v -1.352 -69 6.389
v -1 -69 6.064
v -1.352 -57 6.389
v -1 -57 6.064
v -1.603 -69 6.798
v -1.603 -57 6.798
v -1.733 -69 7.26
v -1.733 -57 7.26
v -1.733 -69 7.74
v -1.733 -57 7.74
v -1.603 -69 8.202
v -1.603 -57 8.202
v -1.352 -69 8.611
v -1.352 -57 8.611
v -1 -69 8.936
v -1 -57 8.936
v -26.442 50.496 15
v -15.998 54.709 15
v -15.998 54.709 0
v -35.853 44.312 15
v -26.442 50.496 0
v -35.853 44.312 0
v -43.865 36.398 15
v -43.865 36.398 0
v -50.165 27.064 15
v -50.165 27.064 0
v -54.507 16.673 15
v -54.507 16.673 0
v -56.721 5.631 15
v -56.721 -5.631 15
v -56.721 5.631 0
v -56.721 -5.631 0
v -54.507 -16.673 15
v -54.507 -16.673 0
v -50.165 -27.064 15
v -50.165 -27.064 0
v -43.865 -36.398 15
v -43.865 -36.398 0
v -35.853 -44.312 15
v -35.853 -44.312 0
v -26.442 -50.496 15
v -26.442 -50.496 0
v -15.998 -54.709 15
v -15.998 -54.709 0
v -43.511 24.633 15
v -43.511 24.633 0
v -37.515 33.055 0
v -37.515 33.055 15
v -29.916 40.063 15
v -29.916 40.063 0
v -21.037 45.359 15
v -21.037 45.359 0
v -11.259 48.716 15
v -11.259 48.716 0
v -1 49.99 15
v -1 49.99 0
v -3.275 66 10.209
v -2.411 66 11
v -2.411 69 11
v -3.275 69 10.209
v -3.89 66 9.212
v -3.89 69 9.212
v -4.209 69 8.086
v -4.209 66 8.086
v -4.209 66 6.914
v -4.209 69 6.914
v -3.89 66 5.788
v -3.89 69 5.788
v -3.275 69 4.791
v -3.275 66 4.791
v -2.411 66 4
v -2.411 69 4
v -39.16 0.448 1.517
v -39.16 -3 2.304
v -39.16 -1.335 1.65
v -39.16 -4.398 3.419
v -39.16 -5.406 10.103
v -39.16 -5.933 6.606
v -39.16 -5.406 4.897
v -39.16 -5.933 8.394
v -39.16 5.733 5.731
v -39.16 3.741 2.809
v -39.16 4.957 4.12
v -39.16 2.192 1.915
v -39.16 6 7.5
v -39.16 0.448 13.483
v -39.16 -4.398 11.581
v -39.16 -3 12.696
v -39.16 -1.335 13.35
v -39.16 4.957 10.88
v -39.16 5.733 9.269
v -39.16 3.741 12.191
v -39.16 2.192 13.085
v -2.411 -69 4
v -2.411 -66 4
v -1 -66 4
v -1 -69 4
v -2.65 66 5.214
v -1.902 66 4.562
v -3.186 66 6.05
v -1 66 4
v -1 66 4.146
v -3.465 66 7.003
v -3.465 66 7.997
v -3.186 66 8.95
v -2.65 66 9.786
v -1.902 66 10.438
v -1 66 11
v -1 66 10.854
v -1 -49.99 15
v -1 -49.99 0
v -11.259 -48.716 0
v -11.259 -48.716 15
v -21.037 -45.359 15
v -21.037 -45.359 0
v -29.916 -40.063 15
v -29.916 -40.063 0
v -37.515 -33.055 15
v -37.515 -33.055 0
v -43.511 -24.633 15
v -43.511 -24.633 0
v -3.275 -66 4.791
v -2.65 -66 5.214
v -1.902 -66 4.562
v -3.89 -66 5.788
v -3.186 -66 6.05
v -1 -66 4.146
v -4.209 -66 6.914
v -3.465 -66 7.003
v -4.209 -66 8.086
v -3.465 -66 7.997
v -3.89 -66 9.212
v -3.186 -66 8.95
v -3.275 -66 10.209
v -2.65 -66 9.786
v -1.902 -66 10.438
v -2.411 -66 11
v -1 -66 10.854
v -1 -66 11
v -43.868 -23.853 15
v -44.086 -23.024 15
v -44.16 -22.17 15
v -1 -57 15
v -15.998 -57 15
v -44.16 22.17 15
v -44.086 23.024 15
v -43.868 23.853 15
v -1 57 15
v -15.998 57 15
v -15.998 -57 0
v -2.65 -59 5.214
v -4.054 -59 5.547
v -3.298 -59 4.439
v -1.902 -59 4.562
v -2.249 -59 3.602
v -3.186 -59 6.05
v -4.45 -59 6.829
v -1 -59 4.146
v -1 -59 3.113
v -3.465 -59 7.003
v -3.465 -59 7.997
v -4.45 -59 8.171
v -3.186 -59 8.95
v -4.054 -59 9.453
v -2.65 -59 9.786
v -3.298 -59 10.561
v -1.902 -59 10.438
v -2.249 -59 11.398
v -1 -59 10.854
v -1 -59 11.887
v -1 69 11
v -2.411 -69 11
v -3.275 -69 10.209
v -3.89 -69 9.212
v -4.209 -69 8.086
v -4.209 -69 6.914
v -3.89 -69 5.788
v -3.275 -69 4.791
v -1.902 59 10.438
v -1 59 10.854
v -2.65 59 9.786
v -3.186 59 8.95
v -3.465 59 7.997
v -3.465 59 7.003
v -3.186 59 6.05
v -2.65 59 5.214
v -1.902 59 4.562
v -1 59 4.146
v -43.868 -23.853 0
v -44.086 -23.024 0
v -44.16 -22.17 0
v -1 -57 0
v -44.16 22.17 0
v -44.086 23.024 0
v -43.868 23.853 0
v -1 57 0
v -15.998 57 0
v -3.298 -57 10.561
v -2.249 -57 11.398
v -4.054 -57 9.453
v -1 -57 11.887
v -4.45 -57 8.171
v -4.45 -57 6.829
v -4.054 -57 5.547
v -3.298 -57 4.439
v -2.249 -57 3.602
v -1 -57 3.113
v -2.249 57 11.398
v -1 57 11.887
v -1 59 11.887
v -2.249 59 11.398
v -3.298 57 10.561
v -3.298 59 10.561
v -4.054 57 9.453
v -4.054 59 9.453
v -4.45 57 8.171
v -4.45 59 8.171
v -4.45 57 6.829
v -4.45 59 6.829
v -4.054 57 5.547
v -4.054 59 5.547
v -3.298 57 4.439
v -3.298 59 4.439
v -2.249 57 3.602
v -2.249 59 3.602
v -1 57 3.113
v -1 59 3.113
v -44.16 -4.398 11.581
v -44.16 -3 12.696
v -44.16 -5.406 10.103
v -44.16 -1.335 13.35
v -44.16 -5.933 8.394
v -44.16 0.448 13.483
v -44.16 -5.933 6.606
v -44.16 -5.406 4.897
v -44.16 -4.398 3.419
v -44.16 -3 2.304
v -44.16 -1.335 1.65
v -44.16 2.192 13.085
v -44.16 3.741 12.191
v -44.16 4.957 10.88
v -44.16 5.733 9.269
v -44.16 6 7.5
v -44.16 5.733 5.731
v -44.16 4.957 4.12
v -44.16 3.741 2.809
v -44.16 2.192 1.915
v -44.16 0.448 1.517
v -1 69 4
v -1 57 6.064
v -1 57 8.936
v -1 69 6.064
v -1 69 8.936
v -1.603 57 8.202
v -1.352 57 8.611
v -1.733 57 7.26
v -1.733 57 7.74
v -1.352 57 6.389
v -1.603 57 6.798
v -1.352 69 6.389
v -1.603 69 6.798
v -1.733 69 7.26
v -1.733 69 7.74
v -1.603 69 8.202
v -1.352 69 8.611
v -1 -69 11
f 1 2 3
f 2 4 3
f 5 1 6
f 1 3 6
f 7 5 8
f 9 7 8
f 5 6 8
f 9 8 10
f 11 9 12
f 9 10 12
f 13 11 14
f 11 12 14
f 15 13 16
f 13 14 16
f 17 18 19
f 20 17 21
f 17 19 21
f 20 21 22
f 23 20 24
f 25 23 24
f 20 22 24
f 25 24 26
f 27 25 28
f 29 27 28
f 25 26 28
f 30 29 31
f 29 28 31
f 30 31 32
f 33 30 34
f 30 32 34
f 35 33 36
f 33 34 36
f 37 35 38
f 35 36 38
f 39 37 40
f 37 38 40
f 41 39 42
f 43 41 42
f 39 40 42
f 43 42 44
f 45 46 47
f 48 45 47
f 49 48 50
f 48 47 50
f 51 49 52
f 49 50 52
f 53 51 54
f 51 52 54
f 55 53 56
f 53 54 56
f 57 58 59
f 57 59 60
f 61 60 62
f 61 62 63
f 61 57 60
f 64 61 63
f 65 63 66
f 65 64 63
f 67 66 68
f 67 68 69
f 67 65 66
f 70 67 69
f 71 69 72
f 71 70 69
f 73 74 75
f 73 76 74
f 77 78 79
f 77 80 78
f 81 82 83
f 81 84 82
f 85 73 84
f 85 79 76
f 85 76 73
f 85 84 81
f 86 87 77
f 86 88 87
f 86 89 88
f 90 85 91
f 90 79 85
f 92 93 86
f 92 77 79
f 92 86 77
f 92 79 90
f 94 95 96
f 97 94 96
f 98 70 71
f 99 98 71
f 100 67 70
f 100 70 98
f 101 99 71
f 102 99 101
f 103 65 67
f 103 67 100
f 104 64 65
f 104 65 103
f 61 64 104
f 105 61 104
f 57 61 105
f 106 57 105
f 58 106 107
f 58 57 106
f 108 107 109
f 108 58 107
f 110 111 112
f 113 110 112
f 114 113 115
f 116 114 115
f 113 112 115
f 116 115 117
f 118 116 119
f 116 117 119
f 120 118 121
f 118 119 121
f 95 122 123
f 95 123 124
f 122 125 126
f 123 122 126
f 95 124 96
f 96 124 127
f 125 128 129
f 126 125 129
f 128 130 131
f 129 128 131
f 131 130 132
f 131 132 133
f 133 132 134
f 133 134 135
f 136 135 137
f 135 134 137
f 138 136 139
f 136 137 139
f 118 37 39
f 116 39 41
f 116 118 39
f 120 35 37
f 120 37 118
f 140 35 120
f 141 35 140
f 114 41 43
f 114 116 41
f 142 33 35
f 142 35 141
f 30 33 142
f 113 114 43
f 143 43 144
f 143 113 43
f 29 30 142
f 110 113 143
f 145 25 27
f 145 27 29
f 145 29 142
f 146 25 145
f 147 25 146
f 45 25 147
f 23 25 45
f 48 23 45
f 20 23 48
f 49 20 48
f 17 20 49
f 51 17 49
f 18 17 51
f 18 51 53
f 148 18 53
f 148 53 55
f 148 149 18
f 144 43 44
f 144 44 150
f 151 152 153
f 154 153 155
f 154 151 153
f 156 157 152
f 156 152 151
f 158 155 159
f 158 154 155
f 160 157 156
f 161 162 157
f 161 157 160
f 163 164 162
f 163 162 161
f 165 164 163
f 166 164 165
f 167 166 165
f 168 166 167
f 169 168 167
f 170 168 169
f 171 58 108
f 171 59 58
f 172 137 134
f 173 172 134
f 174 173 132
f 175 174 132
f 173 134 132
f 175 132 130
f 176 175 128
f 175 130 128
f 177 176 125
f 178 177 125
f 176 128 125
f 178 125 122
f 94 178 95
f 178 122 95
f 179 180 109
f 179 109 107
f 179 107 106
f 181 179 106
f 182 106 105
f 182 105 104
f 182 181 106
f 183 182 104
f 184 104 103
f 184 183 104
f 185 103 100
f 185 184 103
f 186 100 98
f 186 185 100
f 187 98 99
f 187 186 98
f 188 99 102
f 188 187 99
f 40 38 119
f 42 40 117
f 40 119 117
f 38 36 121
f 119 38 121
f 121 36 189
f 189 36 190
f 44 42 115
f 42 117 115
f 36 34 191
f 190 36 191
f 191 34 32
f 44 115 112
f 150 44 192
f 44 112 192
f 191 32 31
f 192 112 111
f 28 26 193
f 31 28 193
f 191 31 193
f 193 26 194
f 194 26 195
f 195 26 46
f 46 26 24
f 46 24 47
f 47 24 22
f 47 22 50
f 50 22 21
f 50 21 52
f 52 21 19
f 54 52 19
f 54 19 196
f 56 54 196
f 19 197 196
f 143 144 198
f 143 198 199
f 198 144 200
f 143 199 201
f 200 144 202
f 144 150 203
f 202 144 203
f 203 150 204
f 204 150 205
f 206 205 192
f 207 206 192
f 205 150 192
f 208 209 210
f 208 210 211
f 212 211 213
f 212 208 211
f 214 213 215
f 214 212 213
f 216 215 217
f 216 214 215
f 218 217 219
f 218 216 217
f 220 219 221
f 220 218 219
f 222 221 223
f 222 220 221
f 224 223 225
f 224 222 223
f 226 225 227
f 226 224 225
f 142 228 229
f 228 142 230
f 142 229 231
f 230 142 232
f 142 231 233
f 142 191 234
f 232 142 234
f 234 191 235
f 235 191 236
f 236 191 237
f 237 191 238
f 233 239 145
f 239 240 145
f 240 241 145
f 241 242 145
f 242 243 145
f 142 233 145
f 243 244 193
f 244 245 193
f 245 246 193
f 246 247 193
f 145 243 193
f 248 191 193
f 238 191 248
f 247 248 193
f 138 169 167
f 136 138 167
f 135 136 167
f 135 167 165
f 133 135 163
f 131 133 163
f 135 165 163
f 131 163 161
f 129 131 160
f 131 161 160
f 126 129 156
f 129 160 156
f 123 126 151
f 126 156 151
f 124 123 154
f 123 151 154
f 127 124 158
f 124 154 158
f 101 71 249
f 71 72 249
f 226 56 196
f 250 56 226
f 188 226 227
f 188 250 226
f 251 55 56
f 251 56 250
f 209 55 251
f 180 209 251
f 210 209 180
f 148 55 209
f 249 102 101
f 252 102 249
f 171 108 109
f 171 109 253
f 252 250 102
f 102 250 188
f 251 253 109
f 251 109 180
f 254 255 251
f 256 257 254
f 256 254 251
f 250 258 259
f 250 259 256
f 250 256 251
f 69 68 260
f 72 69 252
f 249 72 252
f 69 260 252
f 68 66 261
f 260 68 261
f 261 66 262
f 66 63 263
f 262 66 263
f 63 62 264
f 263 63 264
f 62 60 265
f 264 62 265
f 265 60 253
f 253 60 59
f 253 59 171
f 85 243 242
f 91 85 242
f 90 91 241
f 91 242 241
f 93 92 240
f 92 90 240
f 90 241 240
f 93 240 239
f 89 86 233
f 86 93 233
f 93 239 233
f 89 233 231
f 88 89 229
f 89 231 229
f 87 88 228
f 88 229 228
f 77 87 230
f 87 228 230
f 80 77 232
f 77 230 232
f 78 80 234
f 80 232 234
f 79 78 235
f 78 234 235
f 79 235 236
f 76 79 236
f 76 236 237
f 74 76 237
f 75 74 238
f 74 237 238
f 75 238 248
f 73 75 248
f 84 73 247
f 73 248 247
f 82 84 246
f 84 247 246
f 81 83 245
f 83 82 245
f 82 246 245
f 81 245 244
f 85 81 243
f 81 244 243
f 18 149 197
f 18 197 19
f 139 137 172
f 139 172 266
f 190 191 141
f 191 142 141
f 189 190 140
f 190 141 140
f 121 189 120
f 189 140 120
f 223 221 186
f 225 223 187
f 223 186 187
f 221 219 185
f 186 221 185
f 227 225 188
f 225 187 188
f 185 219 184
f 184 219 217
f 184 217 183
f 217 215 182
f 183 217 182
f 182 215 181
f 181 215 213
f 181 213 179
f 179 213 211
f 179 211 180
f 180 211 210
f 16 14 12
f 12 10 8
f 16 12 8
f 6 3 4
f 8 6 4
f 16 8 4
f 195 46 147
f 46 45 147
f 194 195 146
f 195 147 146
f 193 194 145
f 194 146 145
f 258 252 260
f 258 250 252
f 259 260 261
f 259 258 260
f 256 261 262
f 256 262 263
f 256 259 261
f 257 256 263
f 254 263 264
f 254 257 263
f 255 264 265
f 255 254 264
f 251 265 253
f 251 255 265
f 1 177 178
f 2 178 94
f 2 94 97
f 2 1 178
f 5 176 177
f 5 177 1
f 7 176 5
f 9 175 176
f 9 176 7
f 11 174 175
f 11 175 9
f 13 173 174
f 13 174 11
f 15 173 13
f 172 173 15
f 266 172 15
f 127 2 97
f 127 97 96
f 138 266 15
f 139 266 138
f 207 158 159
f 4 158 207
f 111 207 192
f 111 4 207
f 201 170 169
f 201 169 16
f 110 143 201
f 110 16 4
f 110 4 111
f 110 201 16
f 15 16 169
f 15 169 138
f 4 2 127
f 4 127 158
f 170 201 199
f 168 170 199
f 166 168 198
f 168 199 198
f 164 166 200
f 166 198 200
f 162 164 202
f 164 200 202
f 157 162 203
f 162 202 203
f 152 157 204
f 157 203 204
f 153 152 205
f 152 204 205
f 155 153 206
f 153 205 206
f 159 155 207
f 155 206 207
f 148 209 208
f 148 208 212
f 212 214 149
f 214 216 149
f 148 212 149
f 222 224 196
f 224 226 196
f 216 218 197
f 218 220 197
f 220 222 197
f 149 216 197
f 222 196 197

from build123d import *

# Parameters (mm, degrees)
F1_DEPTH  = 15
F2_R      = 6
F3_DEPTH  = 5
F4_R      = 5
F6_DEPTH  = 2
F8_DEPTH  = 7
F10_DEPTH = 3
F11_DEPTH = 25
F13_W     = 146.8421146274
F13_H     = 28.1250011176
F14_DEPTH = 1
F15_W     = 11.3657170441
F15_H     = 11.5304403007
F15_W_2   = 13.3423628286
F15_H_2   = 13.0129233003
F16_DEPTH = 4
F17_W     = 19.5150814822
F17_H     = 12.7272193491
F17_W_2   = 18.9494257321
F17_H_2   = 10.7474377315
F18_DEPTH = 4


with BuildPart() as f1:
    # F0 (on Top) → F1 (new body)
    with BuildSketch(Plane.XY):
        with BuildLine():
            ThreePointArc((-44.16, 23.4498272915), (-25.7634298515, 42.8514373421), (0, 50))
            Line((0, 50), (0, 57))
            Line((0, 57), (-15.9976914198, 57))
            Line((-15.9976914198, 57), (-15.9976914198, 54.7089925811))
            ThreePointArc((-15.9976914198, 54.7089925811), (-57, 0), (-15.9976914198, -54.7089925811))
            Line((-15.9976914198, -54.7089925811), (-15.9976914198, -57))
            Line((-15.9976914198, -57), (0, -57))
            Line((0, -57), (0, -50))
            ThreePointArc((0, -50), (-25.7634298515, -42.8514373421), (-44.16, -23.4498272915))
            Line((-44.16, -23.4498272915), (-44.16, 23.4498272915))
        make_face()
    extrude(amount=F1_DEPTH)

    # F2 (on face) → F3 (join)
    with BuildSketch(Plane.YZ.offset(-44.16)):
        with Locations((0, 7.5)):
            Circle(F2_R)
    extrude(amount=F3_DEPTH)

    # F4
    f4_edges = [f1.edges().sort_by_distance(p)[0] for p in [
        (-44.16, 23.449827, 7.5),
        (-44.16, -23.449827, 7.5),
    ]]
    fillet(f4_edges, radius=F4_R)

    # F5 (on face) → F6 (join)
    with BuildSketch(Plane.XZ.offset(57)):
        with BuildLine():
            Line((0, 9.25), (0, 12))
            ThreePointArc((0, 12), (-4.5, 7.5), (0, 3))
            Line((0, 3), (0, 5.75))
            ThreePointArc((0, 5.75), (-1.75, 7.5), (0, 9.25))
        make_face()
    extrude(amount=F6_DEPTH)

    # F7 (on face) → F8 (join)
    with BuildSketch(Plane.XZ.offset(59)):
        with BuildLine():
            Line((0, 9.25), (0, 11))
            ThreePointArc((0, 11), (-3.5, 7.5), (0, 4))
            Line((0, 4), (0, 5.75))
            ThreePointArc((0, 5.75), (-1.75, 7.5), (0, 9.25))
        make_face()
    extrude(amount=F8_DEPTH)

    # F9 (on face) → F10 (join)
    with BuildSketch(Plane.XZ.offset(66)):
        with BuildLine():
            Line((0, 3.25), (0, 11.75))
            ThreePointArc((0, 11.75), (-4.25, 7.5), (0, 3.25))
        make_face()
    extrude(amount=F10_DEPTH)

    # F11 (cut): a face of the model
    f11_faces = [f1.faces().sort_by_distance(p)[0] for p in [
        (-0.7427230678, -66, 7.5),
    ]]
    extrude(f11_faces, amount=-F11_DEPTH, mode=Mode.SUBTRACT)

    # F12: F1 across plane


with BuildPart() as f1_1:
    add(f1.part)
    add(f1.part.mirror(Plane.XZ))

    # F13 (on Right) → F14 (cut)
    with BuildSketch(Plane.YZ):
        with Locations((0.2960525453, 7.5493426993)):
            Rectangle(F13_W, F13_H)
    extrude(amount=-F14_DEPTH, mode=Mode.SUBTRACT)

    # F15 (on Top) → F16 (cut)
    with BuildSketch(Plane.XY):
        with Locations((-1.9552764716, -64.7652201504)):
            Rectangle(F15_W, F15_H)
        with Locations((-2.1199961193, 65.5064616501)):
            Rectangle(F15_W_2, F15_H_2)
    extrude(amount=F16_DEPTH, mode=Mode.SUBTRACT)

    # F17 (on face) → F18 (cut)
    with BuildSketch(Plane.XY.offset(15)):
        with Locations((-4.4578294758, 65.3636096745)):
            Rectangle(F17_W, F17_H)
        with Locations((-2.7608656596, -64.3737188657)):
            Rectangle(F17_W_2, F17_H_2)
    extrude(amount=-F18_DEPTH, mode=Mode.SUBTRACT)


solid = f1_1.part
